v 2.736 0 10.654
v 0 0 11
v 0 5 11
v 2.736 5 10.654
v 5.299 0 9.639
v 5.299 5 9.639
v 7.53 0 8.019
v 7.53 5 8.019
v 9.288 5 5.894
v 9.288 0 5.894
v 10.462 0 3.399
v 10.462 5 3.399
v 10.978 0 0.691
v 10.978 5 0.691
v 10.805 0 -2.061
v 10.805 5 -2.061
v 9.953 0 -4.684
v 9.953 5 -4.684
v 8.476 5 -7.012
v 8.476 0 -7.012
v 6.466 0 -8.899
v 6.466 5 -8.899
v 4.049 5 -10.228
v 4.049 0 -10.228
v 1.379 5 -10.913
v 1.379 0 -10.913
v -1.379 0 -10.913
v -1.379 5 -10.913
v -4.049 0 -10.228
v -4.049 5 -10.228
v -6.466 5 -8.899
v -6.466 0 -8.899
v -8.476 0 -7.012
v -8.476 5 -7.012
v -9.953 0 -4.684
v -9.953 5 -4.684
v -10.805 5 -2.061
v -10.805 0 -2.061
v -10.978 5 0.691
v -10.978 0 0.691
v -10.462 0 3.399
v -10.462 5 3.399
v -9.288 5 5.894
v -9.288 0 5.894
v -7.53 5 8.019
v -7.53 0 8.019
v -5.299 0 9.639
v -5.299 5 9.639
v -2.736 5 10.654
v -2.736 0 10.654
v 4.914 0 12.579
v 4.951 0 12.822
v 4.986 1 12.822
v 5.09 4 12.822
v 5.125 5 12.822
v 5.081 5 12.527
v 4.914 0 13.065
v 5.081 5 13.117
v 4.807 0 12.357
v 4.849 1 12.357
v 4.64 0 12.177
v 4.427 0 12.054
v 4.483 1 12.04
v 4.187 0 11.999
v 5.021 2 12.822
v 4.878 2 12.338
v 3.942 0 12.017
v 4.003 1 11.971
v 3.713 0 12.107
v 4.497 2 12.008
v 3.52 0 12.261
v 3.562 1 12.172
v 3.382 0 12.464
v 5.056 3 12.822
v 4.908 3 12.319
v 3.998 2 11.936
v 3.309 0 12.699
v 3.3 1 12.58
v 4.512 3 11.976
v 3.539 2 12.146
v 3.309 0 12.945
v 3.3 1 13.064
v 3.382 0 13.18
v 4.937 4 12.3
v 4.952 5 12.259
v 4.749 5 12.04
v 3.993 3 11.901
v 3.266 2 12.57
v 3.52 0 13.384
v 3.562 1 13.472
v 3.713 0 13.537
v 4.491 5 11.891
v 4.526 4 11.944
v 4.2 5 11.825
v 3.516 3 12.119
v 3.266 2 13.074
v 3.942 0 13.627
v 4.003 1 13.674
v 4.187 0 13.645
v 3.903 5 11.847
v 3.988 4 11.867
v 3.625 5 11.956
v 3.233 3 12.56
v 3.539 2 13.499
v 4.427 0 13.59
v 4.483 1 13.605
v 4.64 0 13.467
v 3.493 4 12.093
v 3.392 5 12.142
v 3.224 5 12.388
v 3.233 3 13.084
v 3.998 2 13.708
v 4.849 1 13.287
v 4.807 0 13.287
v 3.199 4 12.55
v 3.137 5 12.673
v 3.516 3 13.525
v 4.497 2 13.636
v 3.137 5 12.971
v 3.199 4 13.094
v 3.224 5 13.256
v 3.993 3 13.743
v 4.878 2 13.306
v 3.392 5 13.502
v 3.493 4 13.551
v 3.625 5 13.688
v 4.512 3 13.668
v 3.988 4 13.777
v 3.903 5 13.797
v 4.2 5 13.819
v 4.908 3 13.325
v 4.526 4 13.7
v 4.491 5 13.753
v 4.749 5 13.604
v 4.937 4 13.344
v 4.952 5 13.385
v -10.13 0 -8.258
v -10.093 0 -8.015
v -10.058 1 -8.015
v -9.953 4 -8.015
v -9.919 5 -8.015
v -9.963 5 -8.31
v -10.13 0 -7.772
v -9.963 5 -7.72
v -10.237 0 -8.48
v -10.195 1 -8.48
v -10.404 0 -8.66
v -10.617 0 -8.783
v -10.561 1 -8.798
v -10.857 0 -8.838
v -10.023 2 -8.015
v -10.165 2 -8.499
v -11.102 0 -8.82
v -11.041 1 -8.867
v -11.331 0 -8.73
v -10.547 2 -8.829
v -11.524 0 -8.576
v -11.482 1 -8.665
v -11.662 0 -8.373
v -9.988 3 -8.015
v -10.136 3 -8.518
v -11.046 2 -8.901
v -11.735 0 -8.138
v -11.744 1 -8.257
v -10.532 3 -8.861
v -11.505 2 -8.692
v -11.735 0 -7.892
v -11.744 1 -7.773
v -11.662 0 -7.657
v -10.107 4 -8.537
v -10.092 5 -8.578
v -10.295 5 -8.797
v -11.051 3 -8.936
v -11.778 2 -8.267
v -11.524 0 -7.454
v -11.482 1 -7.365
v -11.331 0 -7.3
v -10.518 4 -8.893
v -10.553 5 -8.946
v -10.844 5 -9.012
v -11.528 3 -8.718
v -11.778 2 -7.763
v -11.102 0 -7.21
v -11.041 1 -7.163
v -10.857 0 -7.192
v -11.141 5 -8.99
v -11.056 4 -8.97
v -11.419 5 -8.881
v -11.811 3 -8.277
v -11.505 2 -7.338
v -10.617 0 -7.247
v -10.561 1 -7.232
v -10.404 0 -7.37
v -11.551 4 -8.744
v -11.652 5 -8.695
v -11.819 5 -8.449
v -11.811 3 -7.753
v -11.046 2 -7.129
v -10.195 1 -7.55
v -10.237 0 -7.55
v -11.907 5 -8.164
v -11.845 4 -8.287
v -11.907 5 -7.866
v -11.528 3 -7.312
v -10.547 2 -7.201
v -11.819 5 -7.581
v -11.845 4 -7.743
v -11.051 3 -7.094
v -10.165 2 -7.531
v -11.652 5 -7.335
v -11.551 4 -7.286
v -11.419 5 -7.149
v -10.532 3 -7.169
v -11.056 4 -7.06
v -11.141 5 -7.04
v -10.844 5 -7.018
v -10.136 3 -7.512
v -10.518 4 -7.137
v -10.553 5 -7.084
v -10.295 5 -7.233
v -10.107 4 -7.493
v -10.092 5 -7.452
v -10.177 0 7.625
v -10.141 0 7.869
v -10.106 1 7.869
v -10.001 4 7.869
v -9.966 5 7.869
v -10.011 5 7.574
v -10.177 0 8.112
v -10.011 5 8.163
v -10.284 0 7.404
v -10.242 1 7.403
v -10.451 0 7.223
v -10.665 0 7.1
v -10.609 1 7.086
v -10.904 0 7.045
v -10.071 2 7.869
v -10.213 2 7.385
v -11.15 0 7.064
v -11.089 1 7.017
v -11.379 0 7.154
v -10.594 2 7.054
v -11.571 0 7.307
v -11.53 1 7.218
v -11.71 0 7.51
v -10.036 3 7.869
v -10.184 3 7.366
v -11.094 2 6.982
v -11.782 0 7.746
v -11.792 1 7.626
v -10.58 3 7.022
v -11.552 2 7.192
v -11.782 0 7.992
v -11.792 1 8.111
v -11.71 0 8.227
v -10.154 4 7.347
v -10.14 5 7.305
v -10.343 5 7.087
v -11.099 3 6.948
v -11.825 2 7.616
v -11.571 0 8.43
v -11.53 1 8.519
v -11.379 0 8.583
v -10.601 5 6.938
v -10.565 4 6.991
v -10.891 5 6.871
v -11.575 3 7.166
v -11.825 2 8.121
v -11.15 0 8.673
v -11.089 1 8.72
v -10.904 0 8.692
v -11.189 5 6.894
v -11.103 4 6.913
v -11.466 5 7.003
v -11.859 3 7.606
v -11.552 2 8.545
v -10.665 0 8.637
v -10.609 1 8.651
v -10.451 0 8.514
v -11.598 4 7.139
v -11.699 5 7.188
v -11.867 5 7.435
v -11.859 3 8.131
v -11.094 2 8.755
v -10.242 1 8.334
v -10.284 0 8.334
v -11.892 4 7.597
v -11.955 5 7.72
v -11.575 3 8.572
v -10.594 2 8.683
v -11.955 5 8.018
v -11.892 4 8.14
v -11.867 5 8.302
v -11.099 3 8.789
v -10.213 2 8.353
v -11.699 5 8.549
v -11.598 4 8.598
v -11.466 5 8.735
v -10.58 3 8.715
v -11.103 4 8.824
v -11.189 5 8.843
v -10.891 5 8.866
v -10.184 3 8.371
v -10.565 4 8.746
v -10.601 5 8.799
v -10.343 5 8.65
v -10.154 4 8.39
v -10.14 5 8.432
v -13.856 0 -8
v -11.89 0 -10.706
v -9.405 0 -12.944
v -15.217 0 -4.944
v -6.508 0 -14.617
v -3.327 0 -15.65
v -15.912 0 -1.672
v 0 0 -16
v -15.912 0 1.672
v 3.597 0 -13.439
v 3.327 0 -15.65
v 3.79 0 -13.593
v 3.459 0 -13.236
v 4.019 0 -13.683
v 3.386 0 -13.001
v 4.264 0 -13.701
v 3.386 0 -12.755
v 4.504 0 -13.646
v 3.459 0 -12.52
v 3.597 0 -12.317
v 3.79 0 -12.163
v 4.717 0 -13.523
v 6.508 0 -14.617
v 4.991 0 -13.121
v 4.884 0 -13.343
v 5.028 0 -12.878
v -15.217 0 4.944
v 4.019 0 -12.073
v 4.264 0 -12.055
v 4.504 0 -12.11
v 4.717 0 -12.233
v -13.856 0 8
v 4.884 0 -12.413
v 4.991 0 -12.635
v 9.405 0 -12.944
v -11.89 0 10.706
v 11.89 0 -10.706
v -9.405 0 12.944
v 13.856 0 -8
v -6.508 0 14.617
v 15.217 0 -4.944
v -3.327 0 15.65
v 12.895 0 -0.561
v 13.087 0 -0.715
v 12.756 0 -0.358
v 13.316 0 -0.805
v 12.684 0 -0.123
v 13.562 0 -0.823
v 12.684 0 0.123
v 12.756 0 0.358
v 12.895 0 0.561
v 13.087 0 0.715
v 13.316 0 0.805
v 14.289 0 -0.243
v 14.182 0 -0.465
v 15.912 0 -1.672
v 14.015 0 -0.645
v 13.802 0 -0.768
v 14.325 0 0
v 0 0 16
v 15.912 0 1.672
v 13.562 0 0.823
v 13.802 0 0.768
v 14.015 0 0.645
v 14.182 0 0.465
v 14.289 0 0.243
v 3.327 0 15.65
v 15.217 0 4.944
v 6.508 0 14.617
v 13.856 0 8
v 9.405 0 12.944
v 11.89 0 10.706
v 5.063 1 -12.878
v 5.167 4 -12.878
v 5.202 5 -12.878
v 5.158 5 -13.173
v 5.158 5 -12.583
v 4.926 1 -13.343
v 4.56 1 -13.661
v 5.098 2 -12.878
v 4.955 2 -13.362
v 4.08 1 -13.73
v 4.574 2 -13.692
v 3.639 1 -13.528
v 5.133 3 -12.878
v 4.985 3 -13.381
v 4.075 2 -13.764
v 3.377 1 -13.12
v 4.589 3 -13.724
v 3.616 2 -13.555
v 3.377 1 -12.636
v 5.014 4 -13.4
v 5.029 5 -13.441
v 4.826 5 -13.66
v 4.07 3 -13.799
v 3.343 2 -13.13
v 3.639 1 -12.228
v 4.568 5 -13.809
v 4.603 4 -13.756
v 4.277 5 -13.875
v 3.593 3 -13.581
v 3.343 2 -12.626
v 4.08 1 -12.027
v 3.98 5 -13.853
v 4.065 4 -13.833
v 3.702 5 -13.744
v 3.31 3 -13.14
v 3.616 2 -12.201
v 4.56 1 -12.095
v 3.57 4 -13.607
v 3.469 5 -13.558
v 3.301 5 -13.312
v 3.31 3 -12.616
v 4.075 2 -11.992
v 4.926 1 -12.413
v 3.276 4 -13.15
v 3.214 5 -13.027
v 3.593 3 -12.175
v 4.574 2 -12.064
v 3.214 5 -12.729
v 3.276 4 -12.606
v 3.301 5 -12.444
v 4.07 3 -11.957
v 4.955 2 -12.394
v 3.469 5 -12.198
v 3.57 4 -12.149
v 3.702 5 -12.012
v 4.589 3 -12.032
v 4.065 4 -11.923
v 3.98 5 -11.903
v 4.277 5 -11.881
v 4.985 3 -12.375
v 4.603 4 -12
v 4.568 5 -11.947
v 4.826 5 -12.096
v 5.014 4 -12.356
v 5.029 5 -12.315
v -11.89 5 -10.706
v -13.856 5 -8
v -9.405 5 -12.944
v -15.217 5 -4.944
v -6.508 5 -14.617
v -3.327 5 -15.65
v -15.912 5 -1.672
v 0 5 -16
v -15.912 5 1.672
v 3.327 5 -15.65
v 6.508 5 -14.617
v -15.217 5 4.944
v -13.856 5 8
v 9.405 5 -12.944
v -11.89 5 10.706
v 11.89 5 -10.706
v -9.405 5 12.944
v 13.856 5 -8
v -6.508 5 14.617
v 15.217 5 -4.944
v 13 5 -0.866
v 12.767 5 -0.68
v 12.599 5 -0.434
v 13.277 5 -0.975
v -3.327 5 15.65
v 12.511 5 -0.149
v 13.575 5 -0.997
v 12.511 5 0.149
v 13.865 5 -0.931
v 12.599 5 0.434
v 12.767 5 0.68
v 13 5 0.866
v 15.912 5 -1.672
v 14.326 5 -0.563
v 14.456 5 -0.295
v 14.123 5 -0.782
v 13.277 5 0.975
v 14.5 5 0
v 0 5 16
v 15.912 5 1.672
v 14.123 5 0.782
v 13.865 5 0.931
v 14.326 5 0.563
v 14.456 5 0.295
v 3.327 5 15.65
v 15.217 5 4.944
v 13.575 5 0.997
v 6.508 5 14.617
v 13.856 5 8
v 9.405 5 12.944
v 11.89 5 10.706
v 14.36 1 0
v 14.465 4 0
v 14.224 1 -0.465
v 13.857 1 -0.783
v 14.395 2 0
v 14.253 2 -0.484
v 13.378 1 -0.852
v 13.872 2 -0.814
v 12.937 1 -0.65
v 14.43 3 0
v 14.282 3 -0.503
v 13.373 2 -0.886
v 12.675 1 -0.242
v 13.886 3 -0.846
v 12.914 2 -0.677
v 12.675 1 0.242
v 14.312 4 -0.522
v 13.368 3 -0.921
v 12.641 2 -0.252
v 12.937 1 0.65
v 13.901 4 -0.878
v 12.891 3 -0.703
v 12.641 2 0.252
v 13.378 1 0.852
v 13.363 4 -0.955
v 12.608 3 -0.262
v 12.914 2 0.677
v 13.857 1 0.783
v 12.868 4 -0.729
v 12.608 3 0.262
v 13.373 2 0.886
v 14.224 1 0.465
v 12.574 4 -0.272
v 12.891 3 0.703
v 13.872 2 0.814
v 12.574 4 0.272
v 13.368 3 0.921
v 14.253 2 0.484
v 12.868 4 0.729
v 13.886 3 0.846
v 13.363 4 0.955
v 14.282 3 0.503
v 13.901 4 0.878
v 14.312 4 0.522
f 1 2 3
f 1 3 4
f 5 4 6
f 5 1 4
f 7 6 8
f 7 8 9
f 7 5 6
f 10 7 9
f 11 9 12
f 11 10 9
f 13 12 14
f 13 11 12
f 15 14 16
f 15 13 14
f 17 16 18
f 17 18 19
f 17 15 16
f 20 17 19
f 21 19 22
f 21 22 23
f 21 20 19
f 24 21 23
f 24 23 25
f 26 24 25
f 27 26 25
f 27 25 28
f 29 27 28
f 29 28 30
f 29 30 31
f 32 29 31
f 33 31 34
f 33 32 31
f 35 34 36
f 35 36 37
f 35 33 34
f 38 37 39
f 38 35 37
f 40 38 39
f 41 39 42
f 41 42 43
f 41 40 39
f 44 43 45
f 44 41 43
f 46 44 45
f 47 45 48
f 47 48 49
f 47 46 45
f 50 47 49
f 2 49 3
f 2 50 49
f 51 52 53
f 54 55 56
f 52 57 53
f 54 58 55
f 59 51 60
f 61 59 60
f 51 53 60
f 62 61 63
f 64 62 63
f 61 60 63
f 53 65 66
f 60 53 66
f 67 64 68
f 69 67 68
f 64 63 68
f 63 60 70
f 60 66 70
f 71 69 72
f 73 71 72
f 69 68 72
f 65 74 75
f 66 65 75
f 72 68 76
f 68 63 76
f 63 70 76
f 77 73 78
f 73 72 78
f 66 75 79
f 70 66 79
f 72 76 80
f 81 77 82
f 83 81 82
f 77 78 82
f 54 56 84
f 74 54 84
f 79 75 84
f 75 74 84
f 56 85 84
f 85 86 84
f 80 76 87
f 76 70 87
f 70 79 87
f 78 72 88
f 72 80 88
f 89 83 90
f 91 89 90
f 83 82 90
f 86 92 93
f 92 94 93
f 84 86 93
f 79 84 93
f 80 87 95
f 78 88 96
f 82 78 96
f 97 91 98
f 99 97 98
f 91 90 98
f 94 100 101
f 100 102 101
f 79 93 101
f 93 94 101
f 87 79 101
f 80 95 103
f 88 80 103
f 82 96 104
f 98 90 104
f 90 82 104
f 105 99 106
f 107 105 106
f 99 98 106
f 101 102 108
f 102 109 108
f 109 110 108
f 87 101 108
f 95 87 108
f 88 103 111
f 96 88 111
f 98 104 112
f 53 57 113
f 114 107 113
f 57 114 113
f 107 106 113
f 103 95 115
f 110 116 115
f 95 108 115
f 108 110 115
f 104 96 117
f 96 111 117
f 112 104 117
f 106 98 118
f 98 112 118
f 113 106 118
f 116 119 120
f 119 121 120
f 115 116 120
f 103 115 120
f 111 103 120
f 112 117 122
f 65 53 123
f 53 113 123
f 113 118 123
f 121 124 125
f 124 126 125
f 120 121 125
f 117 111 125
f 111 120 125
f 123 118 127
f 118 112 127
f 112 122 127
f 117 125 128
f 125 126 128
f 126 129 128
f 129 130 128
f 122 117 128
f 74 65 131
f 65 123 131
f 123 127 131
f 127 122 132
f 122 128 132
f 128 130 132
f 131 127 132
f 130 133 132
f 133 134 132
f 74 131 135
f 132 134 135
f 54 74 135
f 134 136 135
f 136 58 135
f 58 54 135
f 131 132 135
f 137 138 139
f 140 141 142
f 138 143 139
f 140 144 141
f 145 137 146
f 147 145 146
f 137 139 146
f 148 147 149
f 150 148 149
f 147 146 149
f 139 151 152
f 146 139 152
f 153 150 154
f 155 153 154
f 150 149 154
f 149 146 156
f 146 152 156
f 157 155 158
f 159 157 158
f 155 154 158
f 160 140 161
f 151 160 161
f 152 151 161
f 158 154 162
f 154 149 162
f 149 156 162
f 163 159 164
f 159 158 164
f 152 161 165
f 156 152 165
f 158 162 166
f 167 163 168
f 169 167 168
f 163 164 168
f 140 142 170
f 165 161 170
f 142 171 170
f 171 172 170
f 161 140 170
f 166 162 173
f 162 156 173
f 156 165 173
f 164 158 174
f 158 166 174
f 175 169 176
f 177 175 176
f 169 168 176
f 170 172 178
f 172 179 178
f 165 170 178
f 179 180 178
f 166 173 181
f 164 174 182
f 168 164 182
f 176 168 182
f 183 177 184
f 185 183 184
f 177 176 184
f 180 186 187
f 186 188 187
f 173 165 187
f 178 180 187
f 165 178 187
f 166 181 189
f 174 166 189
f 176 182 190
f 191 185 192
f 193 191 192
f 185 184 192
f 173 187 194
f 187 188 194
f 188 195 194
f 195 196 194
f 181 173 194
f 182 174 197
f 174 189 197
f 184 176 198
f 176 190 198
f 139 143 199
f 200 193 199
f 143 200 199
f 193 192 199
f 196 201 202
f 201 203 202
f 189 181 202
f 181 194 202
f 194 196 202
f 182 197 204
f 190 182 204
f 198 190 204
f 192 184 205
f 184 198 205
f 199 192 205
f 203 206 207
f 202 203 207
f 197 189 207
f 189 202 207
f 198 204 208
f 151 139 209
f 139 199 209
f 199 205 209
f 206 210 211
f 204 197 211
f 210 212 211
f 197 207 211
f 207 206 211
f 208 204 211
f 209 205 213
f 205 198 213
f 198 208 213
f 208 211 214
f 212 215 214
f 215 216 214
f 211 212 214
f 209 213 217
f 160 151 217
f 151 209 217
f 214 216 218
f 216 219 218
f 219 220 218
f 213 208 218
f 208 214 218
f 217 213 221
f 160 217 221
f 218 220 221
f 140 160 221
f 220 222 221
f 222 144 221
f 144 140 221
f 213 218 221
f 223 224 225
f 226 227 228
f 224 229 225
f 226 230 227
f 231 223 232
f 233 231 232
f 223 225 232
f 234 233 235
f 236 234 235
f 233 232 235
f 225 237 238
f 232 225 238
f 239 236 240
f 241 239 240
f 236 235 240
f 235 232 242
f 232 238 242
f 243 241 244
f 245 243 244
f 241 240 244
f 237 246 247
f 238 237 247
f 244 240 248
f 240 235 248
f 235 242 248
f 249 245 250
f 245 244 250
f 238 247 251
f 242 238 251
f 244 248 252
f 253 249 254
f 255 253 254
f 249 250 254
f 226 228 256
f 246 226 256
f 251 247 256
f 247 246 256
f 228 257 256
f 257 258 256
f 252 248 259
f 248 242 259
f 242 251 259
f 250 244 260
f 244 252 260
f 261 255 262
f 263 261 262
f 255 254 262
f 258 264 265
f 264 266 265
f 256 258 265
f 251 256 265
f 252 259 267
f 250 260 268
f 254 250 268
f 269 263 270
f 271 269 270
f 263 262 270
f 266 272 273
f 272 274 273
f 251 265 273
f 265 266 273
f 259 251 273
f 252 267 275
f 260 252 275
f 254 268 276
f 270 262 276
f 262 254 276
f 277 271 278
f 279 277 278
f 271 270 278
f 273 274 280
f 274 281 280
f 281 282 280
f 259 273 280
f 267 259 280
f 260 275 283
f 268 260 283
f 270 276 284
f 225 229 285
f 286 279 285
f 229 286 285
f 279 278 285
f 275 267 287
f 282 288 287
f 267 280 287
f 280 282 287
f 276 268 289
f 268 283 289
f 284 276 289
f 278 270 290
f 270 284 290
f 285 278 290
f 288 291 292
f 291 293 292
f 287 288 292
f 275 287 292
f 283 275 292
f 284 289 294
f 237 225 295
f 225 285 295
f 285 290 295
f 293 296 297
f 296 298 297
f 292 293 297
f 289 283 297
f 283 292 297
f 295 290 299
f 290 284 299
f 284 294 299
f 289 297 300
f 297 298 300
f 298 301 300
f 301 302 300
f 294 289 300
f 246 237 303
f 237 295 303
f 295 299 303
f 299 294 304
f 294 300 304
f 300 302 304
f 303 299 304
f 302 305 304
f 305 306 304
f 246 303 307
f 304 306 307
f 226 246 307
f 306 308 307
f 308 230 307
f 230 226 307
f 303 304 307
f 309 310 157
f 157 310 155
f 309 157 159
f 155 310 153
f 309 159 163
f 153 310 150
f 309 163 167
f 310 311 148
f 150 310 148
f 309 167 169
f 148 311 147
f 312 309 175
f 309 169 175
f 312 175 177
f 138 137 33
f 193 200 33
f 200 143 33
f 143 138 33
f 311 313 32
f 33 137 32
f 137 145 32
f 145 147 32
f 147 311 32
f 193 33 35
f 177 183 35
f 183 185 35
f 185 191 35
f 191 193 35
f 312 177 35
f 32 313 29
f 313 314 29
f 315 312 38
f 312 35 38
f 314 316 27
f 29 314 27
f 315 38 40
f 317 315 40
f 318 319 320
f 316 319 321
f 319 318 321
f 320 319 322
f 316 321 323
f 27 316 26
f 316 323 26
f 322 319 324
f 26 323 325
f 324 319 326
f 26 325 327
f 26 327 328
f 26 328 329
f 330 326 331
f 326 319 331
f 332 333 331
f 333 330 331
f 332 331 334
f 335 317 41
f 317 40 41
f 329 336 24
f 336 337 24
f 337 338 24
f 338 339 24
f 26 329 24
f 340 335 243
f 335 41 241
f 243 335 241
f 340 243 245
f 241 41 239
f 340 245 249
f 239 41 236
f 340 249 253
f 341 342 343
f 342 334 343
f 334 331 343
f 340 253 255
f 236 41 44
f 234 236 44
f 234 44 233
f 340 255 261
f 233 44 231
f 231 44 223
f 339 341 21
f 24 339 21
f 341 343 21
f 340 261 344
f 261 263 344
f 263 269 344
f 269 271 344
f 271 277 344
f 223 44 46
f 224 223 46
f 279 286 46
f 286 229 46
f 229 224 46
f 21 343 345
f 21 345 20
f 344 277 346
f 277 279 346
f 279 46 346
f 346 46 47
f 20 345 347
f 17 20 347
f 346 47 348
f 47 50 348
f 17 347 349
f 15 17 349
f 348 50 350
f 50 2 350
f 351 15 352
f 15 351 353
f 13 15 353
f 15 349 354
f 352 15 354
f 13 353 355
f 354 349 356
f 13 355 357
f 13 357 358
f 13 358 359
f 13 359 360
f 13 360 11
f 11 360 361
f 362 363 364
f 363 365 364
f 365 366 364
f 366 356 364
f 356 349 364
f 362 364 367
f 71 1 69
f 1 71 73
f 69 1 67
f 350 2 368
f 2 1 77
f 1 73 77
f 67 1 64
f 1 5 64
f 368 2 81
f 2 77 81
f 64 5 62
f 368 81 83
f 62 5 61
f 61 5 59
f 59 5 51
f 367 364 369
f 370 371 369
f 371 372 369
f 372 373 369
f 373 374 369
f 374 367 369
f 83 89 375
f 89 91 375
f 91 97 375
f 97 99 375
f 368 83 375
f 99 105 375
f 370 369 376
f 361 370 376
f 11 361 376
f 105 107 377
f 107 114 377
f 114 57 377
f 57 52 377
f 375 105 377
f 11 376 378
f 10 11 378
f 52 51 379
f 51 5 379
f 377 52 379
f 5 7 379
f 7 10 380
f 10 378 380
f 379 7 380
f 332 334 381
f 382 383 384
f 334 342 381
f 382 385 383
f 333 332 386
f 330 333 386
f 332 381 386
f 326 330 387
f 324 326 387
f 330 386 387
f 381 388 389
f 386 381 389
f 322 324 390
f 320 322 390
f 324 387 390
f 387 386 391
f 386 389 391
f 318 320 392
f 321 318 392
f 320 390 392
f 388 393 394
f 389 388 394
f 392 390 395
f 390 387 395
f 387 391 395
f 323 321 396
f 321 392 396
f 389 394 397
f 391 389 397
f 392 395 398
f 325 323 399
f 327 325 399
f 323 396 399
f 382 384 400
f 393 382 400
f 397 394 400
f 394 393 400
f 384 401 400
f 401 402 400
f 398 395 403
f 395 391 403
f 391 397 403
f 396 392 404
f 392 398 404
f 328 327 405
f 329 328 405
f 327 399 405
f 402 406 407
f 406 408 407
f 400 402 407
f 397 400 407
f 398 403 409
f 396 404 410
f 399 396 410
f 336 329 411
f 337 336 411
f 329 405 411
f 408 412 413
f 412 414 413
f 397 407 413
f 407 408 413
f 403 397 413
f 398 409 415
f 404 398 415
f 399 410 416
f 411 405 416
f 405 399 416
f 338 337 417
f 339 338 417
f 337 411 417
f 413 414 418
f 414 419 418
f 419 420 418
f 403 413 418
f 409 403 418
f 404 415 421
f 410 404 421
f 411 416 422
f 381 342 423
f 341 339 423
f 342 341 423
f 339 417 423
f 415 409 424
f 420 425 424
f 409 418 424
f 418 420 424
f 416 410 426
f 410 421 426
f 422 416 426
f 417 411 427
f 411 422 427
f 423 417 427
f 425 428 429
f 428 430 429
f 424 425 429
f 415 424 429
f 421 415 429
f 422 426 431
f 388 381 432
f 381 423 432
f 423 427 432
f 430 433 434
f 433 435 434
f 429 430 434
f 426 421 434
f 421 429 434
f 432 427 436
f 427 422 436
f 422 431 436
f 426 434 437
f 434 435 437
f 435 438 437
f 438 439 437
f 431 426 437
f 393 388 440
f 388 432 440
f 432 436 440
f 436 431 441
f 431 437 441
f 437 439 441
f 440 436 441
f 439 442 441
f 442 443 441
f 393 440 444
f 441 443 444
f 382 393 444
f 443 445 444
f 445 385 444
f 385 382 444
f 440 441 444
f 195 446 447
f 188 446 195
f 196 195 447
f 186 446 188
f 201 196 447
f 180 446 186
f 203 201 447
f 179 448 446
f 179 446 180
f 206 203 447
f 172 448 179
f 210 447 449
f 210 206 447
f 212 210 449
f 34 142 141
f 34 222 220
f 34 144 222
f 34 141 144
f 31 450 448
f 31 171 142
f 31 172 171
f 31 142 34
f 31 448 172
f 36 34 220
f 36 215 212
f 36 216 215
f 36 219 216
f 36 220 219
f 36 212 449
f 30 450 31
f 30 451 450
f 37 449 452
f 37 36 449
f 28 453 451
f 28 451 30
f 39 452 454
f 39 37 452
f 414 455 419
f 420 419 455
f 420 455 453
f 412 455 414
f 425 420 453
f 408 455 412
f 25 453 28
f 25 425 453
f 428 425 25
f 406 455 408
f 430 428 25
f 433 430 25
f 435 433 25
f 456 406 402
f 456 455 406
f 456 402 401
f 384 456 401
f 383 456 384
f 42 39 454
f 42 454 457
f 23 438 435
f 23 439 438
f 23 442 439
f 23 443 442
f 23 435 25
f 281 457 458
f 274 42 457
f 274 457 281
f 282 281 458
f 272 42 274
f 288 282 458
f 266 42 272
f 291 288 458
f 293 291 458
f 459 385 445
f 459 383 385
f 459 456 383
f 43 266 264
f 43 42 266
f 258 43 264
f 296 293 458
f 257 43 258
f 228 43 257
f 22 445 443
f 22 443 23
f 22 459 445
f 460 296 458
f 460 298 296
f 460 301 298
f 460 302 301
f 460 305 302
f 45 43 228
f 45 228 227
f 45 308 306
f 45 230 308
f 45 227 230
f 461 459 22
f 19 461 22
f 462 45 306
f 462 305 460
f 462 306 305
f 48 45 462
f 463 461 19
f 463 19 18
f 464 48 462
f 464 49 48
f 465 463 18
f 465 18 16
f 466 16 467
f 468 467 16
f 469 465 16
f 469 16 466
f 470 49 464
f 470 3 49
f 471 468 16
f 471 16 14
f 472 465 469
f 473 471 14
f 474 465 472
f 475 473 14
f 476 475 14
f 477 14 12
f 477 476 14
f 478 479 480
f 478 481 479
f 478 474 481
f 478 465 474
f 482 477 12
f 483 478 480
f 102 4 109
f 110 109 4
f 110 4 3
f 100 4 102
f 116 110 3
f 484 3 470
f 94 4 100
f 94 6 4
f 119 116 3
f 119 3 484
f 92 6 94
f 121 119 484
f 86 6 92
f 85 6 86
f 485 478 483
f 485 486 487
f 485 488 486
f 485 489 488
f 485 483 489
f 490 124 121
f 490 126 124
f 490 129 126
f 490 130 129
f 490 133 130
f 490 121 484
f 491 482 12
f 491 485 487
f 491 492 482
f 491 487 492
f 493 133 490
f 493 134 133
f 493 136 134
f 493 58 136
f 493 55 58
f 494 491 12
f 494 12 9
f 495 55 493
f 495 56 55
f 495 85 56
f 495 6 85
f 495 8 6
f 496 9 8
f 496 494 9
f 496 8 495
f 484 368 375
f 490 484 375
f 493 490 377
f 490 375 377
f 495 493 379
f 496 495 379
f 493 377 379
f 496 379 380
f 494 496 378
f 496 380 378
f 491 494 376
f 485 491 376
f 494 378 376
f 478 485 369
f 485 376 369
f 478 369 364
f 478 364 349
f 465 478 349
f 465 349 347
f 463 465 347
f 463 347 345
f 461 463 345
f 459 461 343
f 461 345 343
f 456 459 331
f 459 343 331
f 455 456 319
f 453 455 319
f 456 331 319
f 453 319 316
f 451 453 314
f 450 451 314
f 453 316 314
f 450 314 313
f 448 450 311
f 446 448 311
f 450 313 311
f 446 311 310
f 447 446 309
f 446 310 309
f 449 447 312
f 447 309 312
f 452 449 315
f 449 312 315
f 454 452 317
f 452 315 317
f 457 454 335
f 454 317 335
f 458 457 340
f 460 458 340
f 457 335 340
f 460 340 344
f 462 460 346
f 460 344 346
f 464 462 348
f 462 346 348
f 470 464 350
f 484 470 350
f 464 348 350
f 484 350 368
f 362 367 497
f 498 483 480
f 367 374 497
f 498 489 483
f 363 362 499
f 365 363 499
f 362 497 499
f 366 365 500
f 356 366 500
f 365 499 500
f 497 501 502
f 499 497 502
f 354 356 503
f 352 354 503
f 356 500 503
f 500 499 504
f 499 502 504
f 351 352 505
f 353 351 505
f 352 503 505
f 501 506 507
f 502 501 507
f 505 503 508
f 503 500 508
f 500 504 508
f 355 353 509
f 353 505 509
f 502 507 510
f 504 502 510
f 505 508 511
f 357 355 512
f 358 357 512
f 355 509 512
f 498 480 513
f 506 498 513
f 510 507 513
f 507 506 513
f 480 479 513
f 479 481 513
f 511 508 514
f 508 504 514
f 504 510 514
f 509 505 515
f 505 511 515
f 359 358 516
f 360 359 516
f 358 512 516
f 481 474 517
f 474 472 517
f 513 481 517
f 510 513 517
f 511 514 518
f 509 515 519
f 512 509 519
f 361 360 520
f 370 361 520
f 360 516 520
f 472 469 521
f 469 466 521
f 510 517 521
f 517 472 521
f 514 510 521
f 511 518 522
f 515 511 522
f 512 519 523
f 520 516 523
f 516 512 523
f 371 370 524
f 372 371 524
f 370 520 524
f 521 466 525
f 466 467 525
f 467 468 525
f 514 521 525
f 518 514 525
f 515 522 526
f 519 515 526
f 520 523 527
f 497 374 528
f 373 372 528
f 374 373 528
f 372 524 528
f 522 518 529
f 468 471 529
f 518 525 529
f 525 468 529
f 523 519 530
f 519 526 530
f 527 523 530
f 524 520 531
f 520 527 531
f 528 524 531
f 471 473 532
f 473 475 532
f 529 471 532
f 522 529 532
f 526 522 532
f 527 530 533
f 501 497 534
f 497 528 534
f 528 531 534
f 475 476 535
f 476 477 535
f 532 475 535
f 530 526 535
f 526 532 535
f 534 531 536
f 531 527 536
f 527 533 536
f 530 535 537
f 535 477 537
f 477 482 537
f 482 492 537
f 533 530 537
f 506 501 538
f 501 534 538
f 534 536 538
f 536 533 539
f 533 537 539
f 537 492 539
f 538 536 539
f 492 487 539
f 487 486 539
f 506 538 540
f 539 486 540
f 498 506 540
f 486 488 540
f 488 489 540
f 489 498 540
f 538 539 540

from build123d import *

# Parameters (mm, degrees)
SKETCH1_R                    = 16
SKETCH1_R_2                  = 11
BOSS_EXTRUDE2_DEPTH          = 5
SKETCH2_R                    = 1
CUT_EXTRUDE1_DEPTH           = 5
CUT_EXTRUDE1_DRAFT           = -2
CUT_EXTRUDE1_PROFILE_2_DEPTH = 5
CUT_EXTRUDE1_PROFILE_2_DRAFT = -2
CUT_EXTRUDE1_PROFILE_3_DEPTH = 5
CUT_EXTRUDE1_PROFILE_3_DRAFT = -2
CUT_EXTRUDE1_PROFILE_4_DEPTH = 5
CUT_EXTRUDE1_PROFILE_4_DRAFT = -2
CUT_EXTRUDE1_PROFILE_5_DEPTH = 5
CUT_EXTRUDE1_PROFILE_5_DRAFT = -2


with BuildPart() as part:
    # Sketch1 → Boss-Extrude2 (new body)
    with BuildSketch(Plane(origin=(0, 0, 0), x_dir=(1, 0, 0), z_dir=(0, 1, 0))):
        with Locations(Location((0, 0, 0), (0, 0, 270))):
            Circle(SKETCH1_R)
        with Locations(Location((0, 0, 0), (0, 0, 270))):
            Circle(SKETCH1_R_2, mode=Mode.SUBTRACT)
    extrude(amount=BOSS_EXTRUDE2_DEPTH)


with BuildPart() as cut_extrude1_tool:
    # Sketch2 → Cut-Extrude1 (with draft: the straight prism first)
    with BuildSketch(Plane(origin=(0, 5, 0), x_dir=(1, 0, 0), z_dir=(0, 1, 0))):
        with Locations((-10.918529424, 8.01503688)):
            Circle(SKETCH2_R)
    extrude(amount=-CUT_EXTRUDE1_DEPTH)
    # Cut-Extrude1: the draft: its side faces are tilted about the plane it starts from
    cut_extrude1_sides = [cut_extrude1_tool.faces().sort_by_distance(p)[0] for p in [
        (-11.918529424, 2.5, -8.01503688),
    ]]
    draft(cut_extrude1_sides, Plane(origin=(0, 5, 0), x_dir=(1, 0, 0), z_dir=(0, 1, 0)), CUT_EXTRUDE1_DRAFT)


with BuildPart() as part_1:
    add(part.part)

    # Cut-Extrude1: cut by cut_extrude1_tool
    add(cut_extrude1_tool.part, mode=Mode.SUBTRACT)


with BuildPart() as cut_extrude1_profile_2_tool:
    # Sketch2 → Cut-Extrude1 profile 2 (with draft: the straight prism first)
    with BuildSketch(Plane(origin=(0, 5, 0), x_dir=(1, 0, 0), z_dir=(0, 1, 0))):
        with Locations((-10.966125757, -7.868550431)):
            Circle(SKETCH2_R)
    extrude(amount=-CUT_EXTRUDE1_PROFILE_2_DEPTH)
    # Cut-Extrude1 profile 2: the draft: its side faces are tilted about the plane it starts from
    cut_extrude1_profile_2_sides = [cut_extrude1_profile_2_tool.faces().sort_by_distance(p)[0] for p in [
        (-11.966125757, 2.5, 7.868550431),
    ]]
    draft(cut_extrude1_profile_2_sides, Plane(origin=(0, 5, 0), x_dir=(1, 0, 0), z_dir=(0, 1, 0)), CUT_EXTRUDE1_PROFILE_2_DRAFT)


with BuildPart() as part_2:
    add(part_1.part)

    # Cut-Extrude1 profile 2: cut by cut_extrude1_profile_2_tool
    add(cut_extrude1_profile_2_tool.part, mode=Mode.SUBTRACT)


with BuildPart() as cut_extrude1_profile_3_tool:
    # Sketch2 → Cut-Extrude1 profile 3 (with draft: the straight prism first)
    with BuildSketch(Plane(origin=(0, 5, 0), x_dir=(1, 0, 0), z_dir=(0, 1, 0))):
        with Locations((4.125355383, -12.822115645)):
            Circle(SKETCH2_R)
    extrude(amount=-CUT_EXTRUDE1_PROFILE_3_DEPTH)
    # Cut-Extrude1 profile 3: the draft: its side faces are tilted about the plane it starts from
    cut_extrude1_profile_3_sides = [cut_extrude1_profile_3_tool.faces().sort_by_distance(p)[0] for p in [
        (3.125355383, 2.5, 12.822115645),
    ]]
    draft(cut_extrude1_profile_3_sides, Plane(origin=(0, 5, 0), x_dir=(1, 0, 0), z_dir=(0, 1, 0)), CUT_EXTRUDE1_PROFILE_3_DRAFT)


with BuildPart() as part_3:
    add(part_2.part)

    # Cut-Extrude1 profile 3: cut by cut_extrude1_profile_3_tool
    add(cut_extrude1_profile_3_tool.part, mode=Mode.SUBTRACT)


with BuildPart() as cut_extrude1_profile_4_tool:
    # Sketch2 → Cut-Extrude1 profile 4 (with draft: the straight prism first)
    with BuildSketch(Plane(origin=(0, 5, 0), x_dir=(1, 0, 0), z_dir=(0, 1, 0))):
        with Locations((13.5, 0)):
            Circle(SKETCH2_R)
    extrude(amount=-CUT_EXTRUDE1_PROFILE_4_DEPTH)
    # Cut-Extrude1 profile 4: the draft: its side faces are tilted about the plane it starts from
    cut_extrude1_profile_4_sides = [cut_extrude1_profile_4_tool.faces().sort_by_distance(p)[0] for p in [
        (12.5, 2.5, 0),
    ]]
    draft(cut_extrude1_profile_4_sides, Plane(origin=(0, 5, 0), x_dir=(1, 0, 0), z_dir=(0, 1, 0)), CUT_EXTRUDE1_PROFILE_4_DRAFT)


with BuildPart() as part_4:
    add(part_3.part)

    # Cut-Extrude1 profile 4: cut by cut_extrude1_profile_4_tool
    add(cut_extrude1_profile_4_tool.part, mode=Mode.SUBTRACT)


with BuildPart() as cut_extrude1_profile_5_tool:
    # Sketch2 → Cut-Extrude1 profile 5 (with draft: the straight prism first)
    with BuildSketch(Plane(origin=(0, 5, 0), x_dir=(1, 0, 0), z_dir=(0, 1, 0))):
        with Locations((4.202367867, 12.878068489)):
            Circle(SKETCH2_R)
    extrude(amount=-CUT_EXTRUDE1_PROFILE_5_DEPTH)
    # Cut-Extrude1 profile 5: the draft: its side faces are tilted about the plane it starts from
    cut_extrude1_profile_5_sides = [cut_extrude1_profile_5_tool.faces().sort_by_distance(p)[0] for p in [
        (3.202367867, 2.5, -12.878068489),
    ]]
    draft(cut_extrude1_profile_5_sides, Plane(origin=(0, 5, 0), x_dir=(1, 0, 0), z_dir=(0, 1, 0)), CUT_EXTRUDE1_PROFILE_5_DRAFT)


with BuildPart() as part_5:
    add(part_4.part)

    # Cut-Extrude1 profile 5: cut by cut_extrude1_profile_5_tool
    add(cut_extrude1_profile_5_tool.part, mode=Mode.SUBTRACT)


solid = part_5.part
